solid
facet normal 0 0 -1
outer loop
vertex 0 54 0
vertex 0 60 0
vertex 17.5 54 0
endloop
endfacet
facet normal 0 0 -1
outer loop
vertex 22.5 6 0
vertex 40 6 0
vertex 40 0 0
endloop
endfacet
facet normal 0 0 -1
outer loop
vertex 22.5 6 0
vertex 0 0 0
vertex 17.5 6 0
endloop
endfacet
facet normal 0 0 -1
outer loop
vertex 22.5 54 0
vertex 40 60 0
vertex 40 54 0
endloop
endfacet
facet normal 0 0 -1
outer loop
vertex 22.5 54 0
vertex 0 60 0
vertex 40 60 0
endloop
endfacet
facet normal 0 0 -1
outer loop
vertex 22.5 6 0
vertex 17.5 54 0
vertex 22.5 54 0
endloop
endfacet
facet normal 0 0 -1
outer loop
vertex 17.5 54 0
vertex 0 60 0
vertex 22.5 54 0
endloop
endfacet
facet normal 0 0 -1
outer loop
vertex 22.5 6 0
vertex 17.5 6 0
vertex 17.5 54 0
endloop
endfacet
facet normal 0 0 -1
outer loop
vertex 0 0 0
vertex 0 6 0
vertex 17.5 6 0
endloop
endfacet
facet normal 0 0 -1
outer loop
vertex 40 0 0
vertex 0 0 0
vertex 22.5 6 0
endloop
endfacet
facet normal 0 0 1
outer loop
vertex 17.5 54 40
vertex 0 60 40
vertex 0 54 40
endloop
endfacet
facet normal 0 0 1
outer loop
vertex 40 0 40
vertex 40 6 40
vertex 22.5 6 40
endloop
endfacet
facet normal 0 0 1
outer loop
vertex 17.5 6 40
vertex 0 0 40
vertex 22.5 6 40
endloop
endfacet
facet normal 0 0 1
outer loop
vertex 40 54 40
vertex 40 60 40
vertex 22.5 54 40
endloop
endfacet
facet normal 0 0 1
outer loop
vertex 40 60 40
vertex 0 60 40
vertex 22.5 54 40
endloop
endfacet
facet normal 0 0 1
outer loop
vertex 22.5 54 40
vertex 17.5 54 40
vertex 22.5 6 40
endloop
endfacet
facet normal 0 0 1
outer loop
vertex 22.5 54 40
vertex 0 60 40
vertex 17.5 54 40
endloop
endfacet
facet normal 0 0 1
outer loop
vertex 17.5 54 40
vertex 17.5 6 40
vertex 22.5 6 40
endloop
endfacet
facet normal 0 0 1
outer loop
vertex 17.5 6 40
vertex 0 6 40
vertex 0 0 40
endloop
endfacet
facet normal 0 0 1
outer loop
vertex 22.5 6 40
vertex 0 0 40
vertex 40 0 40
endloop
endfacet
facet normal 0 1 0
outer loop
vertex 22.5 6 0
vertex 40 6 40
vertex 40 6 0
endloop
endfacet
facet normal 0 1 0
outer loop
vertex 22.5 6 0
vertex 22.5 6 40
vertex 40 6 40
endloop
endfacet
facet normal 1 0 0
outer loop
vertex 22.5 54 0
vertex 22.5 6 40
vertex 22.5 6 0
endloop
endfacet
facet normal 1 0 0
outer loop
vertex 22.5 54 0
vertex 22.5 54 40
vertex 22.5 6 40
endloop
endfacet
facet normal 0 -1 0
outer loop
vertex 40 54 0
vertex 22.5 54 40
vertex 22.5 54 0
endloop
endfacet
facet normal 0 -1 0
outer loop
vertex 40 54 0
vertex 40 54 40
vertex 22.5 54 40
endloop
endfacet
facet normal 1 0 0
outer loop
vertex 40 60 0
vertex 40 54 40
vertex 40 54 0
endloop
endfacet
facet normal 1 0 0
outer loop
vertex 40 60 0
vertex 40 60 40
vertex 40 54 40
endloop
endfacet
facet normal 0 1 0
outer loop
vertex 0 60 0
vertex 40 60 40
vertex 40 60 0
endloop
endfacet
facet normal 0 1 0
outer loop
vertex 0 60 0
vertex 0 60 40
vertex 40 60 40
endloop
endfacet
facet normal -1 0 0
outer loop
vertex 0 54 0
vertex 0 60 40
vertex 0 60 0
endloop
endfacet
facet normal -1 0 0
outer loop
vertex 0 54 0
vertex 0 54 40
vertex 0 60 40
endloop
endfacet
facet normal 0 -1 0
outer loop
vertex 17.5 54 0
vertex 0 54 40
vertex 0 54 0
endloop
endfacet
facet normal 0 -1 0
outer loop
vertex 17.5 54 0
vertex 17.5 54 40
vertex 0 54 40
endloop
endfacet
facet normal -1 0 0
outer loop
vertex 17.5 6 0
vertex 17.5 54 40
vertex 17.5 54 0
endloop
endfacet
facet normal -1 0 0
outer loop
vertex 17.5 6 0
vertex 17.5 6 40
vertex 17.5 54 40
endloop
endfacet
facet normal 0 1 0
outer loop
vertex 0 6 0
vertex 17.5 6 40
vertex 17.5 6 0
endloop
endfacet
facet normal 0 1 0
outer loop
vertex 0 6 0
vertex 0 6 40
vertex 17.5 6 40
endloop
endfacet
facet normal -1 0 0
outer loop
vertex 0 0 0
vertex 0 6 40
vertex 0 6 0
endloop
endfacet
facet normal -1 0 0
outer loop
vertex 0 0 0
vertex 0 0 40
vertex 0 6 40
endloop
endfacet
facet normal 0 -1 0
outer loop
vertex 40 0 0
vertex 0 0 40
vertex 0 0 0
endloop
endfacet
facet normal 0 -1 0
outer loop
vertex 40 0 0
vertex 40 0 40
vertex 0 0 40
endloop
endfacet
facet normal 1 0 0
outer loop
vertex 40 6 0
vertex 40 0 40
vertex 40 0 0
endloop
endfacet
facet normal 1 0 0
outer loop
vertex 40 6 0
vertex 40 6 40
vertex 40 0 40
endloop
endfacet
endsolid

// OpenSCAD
$fn = 32;

// ----------------------------------------------------------------------
// Structural section: ibeam 40 x 60 mm
// ----------------------------------------------------------------------

// --- parameters (mm) ---
sec_w = 40;               // section width, X
sec_h = 60;               // section height, Y
flange_t = 6;             // flange thickness
web_t = 5;                // web thickness
plate_t = 40;             // cut length, Z (extrusion height)

profile = [[0, 0], [40, 0], [40, 6], [22.5, 6], [22.5, 54], [40, 54], [40, 60], [0, 60], [0, 54], [17.5, 54], [17.5, 6], [0, 6]];  // primary outline, 12 points, counter clockwise

// --- the one profile operation ---
linear_extrude(height = plate_t) polygon(points = profile);
